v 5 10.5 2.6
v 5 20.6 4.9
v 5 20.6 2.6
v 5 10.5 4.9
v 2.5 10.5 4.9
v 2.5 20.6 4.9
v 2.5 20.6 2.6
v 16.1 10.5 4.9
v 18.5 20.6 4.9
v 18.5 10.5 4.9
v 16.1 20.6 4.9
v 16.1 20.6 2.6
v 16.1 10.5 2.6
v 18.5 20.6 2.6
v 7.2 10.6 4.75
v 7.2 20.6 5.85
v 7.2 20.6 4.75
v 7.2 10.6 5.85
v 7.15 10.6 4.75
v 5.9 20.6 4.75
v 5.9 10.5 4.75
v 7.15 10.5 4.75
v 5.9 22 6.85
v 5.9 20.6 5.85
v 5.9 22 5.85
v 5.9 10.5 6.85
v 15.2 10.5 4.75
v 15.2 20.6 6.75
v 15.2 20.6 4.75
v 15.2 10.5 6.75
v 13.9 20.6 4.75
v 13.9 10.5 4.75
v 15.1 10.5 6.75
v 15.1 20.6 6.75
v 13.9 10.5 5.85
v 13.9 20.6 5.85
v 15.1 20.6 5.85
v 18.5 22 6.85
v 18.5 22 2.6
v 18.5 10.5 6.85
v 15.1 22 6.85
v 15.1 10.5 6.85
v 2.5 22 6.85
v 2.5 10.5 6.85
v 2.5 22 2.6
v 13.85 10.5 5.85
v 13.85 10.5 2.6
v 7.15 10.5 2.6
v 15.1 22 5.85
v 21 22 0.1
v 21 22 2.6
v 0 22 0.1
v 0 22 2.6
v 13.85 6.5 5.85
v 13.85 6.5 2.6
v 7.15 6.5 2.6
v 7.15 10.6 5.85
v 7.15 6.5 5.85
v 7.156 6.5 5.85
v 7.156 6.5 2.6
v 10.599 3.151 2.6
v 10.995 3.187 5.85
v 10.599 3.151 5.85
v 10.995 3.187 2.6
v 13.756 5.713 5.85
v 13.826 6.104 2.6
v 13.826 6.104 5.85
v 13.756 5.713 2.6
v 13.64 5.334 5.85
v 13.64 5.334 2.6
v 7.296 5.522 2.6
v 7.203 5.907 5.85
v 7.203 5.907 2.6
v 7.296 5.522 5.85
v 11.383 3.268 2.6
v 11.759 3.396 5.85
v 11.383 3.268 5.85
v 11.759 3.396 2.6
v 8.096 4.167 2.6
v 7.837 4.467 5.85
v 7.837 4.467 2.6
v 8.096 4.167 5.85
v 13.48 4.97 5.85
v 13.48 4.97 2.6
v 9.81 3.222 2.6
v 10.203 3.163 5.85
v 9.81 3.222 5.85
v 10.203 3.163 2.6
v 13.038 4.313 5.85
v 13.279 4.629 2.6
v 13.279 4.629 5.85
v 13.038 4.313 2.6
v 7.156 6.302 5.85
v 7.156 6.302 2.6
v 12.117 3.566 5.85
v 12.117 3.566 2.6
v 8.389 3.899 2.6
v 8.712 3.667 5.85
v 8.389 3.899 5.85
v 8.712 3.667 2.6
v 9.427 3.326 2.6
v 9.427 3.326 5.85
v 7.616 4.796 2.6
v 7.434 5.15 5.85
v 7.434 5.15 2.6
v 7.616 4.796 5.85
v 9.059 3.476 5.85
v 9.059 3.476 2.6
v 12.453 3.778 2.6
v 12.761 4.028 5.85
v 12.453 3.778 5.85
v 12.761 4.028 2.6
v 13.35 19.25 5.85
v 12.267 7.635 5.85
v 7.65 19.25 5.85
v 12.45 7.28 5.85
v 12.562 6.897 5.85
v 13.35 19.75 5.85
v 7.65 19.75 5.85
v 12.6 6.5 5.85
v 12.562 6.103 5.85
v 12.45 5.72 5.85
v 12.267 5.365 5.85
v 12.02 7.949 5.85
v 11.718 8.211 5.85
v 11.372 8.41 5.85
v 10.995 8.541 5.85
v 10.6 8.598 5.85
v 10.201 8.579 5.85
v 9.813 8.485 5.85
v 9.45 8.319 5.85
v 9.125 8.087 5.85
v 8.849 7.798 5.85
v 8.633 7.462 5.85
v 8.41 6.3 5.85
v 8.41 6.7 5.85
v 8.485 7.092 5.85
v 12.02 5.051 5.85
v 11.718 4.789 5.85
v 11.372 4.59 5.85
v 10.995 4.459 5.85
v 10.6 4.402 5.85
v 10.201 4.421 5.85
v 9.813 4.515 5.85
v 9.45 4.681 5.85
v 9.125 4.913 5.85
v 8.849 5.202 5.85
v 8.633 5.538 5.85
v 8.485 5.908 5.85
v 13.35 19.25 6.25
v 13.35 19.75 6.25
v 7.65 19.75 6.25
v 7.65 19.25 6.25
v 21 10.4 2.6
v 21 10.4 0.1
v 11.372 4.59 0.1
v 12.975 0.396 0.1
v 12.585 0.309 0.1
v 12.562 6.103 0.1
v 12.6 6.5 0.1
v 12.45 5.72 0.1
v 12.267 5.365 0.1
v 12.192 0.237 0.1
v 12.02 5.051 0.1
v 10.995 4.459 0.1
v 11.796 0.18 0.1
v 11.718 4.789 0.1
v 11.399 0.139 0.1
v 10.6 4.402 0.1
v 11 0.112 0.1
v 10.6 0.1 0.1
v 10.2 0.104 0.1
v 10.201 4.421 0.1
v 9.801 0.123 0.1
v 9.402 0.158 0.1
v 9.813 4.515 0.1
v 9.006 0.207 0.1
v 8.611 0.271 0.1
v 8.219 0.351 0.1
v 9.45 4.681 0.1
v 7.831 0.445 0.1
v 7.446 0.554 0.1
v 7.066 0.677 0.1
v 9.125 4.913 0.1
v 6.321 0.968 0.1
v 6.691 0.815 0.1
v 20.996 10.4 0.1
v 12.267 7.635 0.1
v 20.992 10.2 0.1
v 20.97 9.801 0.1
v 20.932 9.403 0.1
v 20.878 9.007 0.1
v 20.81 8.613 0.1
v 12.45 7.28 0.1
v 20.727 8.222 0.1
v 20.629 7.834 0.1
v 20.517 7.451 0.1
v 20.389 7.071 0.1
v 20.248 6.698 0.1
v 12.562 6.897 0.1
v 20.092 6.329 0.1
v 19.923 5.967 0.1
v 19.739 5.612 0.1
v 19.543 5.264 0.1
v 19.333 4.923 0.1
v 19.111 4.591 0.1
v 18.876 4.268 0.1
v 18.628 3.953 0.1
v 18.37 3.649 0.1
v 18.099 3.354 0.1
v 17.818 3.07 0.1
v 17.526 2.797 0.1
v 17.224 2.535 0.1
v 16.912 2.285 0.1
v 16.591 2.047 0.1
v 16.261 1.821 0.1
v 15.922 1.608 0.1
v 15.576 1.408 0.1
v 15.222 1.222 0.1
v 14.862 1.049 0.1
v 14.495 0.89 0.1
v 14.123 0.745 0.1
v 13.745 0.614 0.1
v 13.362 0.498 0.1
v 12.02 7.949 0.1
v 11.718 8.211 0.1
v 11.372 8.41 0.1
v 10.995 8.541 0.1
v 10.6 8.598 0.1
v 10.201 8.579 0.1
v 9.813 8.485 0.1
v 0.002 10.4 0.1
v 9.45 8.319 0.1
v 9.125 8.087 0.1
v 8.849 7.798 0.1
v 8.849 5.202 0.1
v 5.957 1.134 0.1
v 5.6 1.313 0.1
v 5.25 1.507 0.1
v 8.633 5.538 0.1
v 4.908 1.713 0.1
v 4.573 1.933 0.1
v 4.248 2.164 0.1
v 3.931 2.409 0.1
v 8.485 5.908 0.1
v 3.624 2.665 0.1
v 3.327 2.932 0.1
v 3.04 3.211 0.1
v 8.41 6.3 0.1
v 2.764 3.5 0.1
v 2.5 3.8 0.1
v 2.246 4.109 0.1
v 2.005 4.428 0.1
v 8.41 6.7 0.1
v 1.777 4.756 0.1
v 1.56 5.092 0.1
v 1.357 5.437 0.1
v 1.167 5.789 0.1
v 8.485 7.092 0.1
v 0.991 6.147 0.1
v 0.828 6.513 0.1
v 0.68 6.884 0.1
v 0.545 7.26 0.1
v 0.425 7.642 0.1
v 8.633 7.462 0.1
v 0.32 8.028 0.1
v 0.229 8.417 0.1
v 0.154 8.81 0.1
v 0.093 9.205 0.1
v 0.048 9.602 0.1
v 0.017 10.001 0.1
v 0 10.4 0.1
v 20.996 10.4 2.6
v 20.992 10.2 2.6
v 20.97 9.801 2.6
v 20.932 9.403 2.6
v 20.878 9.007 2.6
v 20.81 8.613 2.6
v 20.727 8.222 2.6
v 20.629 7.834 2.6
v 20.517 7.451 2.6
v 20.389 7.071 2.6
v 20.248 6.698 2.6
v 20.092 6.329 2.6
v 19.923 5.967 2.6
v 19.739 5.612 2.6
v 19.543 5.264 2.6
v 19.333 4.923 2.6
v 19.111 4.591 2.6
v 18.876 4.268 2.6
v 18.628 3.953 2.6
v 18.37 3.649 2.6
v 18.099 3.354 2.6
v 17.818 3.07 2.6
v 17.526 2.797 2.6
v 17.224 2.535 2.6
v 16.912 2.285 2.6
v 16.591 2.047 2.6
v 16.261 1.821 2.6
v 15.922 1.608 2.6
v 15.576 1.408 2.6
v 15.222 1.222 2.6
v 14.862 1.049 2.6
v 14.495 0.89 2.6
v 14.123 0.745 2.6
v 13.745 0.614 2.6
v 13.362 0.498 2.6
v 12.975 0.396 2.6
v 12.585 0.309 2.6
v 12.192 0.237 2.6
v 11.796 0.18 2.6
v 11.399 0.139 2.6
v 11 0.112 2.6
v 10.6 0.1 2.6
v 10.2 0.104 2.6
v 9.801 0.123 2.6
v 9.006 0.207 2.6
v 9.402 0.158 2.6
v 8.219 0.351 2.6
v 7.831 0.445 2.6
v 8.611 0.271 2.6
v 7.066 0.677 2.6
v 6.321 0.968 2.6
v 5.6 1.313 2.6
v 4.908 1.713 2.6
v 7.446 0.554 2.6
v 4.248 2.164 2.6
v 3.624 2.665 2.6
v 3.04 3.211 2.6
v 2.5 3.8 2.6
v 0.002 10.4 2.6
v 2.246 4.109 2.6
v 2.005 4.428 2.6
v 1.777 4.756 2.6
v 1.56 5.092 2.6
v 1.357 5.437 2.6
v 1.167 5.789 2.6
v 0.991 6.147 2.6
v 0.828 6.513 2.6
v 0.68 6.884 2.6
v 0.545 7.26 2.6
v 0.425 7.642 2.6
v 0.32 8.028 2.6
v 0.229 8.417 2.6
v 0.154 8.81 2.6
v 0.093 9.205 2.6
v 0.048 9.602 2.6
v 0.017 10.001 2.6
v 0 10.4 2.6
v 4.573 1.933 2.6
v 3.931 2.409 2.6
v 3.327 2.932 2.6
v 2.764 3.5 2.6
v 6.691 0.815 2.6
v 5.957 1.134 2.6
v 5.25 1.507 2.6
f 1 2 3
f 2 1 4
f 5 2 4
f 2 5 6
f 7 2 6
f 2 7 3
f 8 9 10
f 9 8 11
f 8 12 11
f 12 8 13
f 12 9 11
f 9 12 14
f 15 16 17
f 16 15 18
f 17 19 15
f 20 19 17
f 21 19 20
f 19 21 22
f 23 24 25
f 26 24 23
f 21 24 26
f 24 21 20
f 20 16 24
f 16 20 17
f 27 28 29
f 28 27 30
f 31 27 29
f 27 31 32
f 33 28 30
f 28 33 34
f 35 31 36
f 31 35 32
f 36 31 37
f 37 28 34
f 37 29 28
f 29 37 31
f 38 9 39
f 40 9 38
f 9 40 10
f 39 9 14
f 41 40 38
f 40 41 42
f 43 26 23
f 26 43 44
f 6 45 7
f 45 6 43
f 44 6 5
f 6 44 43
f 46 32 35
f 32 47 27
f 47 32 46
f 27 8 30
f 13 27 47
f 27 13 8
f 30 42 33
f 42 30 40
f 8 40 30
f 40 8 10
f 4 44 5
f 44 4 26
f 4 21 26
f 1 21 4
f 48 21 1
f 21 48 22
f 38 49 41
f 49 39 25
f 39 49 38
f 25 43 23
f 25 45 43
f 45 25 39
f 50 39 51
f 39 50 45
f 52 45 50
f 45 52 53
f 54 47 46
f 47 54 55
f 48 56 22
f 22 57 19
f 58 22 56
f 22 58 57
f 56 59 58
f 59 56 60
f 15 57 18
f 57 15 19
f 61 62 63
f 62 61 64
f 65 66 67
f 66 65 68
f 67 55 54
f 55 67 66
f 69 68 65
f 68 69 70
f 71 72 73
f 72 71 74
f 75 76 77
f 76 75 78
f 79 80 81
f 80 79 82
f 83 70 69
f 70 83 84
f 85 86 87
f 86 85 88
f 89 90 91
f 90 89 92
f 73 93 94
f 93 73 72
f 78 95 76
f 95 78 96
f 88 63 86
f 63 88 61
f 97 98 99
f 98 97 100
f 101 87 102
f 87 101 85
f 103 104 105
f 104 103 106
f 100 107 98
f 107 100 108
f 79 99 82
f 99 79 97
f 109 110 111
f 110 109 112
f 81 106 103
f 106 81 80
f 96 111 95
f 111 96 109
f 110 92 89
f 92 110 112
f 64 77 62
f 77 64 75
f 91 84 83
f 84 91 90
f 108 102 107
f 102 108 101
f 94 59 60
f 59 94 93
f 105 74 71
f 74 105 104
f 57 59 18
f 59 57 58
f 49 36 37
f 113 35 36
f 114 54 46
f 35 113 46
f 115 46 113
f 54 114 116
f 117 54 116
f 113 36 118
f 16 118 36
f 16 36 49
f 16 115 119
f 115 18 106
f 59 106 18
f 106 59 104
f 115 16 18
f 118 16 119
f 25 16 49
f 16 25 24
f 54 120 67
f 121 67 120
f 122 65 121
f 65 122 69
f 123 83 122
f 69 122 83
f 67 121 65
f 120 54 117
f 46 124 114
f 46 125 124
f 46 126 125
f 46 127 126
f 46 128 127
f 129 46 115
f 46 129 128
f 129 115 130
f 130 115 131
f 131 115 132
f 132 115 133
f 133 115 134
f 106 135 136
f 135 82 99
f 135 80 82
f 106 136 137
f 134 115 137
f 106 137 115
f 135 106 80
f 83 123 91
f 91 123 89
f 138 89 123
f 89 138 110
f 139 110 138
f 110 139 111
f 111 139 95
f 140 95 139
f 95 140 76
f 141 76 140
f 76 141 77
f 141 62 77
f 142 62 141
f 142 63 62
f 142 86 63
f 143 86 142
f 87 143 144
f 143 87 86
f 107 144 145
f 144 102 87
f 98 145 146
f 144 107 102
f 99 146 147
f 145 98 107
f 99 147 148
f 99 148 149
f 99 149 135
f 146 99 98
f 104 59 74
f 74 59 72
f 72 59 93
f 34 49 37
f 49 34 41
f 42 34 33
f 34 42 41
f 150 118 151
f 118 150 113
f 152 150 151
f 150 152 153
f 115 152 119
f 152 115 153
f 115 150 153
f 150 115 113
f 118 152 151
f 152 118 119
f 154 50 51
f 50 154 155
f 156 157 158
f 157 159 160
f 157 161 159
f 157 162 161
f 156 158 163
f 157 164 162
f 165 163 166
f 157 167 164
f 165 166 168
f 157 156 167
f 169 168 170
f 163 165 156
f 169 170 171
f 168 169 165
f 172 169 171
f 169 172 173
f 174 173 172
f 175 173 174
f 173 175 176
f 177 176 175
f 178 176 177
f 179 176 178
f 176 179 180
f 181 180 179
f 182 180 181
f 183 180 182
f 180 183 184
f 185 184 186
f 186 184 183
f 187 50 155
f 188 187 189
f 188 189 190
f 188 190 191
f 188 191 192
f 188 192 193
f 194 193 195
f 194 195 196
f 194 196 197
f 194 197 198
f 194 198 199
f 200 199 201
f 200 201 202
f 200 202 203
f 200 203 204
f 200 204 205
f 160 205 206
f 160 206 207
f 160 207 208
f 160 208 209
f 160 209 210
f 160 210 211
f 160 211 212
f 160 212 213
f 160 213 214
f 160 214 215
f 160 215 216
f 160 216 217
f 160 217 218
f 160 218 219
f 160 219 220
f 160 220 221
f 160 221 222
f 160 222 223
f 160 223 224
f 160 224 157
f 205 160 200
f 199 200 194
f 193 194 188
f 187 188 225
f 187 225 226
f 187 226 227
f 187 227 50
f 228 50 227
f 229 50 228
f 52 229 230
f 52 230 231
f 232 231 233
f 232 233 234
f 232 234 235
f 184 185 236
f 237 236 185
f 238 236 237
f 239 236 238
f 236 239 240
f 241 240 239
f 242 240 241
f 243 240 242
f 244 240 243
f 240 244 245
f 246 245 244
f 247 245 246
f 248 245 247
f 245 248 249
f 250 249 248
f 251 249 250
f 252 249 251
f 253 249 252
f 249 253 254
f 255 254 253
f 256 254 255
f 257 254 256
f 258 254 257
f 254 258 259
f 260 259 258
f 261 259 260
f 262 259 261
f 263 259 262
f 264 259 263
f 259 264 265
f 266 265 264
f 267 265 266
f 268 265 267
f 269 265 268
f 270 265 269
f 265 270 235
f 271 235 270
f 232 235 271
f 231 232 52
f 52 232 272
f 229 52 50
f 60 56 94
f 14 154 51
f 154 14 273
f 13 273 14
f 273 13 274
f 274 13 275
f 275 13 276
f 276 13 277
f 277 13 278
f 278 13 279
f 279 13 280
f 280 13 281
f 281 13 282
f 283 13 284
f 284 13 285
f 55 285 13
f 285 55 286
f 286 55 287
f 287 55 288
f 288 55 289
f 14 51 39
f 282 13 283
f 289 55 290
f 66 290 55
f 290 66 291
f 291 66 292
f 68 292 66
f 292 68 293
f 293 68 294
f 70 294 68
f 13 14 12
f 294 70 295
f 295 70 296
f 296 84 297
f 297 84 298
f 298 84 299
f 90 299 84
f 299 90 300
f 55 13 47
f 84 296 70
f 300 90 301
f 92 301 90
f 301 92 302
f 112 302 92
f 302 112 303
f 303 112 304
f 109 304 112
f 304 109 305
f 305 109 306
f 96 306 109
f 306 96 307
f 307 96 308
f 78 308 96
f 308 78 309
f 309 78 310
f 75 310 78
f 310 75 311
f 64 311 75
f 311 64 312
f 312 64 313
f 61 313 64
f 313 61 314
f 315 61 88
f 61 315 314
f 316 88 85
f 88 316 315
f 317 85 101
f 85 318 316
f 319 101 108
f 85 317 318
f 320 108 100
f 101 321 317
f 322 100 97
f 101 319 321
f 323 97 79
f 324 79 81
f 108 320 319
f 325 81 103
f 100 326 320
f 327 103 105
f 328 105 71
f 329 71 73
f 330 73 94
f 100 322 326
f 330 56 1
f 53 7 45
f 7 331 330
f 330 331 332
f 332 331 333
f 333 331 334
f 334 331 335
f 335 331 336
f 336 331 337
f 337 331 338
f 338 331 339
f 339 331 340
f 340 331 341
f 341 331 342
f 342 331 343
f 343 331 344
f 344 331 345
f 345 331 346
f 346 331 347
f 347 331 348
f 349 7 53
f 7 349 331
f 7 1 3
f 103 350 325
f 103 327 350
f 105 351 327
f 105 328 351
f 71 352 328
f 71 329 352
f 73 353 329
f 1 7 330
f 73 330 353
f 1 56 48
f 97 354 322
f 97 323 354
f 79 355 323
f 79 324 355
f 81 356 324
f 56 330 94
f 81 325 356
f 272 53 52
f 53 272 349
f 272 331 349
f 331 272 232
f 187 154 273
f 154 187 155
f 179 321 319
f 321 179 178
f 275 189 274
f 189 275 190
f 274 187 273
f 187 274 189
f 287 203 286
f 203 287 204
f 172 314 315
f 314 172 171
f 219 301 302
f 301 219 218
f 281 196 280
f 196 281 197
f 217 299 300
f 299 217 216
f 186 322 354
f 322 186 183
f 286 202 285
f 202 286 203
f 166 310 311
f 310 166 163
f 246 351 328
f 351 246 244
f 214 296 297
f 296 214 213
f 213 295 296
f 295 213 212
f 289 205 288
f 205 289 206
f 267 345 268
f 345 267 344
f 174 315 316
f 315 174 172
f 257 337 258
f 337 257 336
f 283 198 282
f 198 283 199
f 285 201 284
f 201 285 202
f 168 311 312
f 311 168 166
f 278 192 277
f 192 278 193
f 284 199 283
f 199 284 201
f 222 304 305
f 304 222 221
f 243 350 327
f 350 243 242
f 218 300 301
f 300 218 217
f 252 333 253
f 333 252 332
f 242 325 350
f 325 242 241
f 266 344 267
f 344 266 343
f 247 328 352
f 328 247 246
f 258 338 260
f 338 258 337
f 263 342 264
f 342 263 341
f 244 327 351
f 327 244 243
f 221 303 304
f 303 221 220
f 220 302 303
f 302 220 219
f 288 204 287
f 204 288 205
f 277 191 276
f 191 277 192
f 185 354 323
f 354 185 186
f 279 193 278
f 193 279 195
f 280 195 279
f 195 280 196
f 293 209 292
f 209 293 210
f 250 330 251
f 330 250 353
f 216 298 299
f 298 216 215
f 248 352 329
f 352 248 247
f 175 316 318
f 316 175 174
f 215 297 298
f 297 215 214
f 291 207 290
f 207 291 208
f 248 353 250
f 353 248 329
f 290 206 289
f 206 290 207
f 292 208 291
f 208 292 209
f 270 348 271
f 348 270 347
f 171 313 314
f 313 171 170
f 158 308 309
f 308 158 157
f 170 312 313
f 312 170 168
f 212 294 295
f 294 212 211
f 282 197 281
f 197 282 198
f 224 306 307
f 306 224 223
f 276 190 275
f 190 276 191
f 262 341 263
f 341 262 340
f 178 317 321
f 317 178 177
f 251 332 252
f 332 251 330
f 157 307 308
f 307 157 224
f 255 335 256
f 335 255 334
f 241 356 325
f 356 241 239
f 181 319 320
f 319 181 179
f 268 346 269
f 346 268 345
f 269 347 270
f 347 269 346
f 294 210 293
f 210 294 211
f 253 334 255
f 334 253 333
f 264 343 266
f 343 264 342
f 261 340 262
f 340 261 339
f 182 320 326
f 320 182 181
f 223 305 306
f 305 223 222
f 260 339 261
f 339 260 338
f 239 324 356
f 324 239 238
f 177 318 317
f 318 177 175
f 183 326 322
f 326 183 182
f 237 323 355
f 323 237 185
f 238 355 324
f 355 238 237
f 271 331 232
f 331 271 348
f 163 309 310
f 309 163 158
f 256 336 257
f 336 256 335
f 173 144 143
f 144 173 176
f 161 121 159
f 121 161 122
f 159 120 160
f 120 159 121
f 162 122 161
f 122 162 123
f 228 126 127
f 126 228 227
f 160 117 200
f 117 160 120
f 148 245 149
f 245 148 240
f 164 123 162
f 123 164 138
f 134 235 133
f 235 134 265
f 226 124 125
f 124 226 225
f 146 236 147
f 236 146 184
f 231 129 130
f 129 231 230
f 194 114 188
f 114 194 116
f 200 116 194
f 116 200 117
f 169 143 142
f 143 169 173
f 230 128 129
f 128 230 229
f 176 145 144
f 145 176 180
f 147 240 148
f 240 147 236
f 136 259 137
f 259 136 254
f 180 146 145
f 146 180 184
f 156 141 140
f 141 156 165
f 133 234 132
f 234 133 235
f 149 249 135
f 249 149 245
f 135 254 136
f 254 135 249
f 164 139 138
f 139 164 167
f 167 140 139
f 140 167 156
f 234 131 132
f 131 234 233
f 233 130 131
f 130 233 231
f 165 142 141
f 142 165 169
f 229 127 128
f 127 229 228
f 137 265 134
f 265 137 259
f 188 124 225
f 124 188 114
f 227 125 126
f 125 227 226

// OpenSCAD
// Schlaufen Halterung für G5XT PMR Funkgerät

// Resolution for 3D printing:
$fa = 1;
$fs = 0.4;

// Allgemeines:
delta                  =   0.1; // Standard Durchdringung

clip_breite            =  16.0;
clip_laenge            =  11.5;
clip_hoehe             =   4.25 + delta;

oesen_basis_breite     =   6.7;
oesen_basis_laenge     =   4.0;
oesen_durchmesser      =  oesen_basis_breite;
loch_durchmesser       =  oesen_durchmesser - 2.5;

aussparung_breite      =   9.0;
aussparung_laenge      =  clip_laenge + 2*delta;
aussparung_hoehe       =   1.0;

schiene_breite         =   2.5;
schiene_laenge         =  10.0;
schiene_hoehe          =   2.5;

sperre_breite          =  oesen_basis_breite-1.0;
sperre_laenge          =   0.5;
sperre_y_offset        =  clip_laenge - schiene_laenge 
                         + 0.75;
sperre_hoehe           =   0.5;

nut_breite             =   1.2;
nut_laenge             =  schiene_laenge;
nut_hoehe              =   2.0;

deckel_breite          =  21.0;
deckel_laenge          =  clip_laenge;
deckel_hoehe           =   2.5;

module nut() {
    cube([nut_breite + delta,
          nut_laenge + 2*delta, 
          nut_hoehe]);
};

module schiene() {
    cube([schiene_breite + delta,
          schiene_laenge + 2*delta, 
          schiene_hoehe + delta]);
};

module schienen() {
    // Schiene links:
    translate([-delta, 
               clip_laenge - schiene_laenge - delta,
               clip_hoehe - schiene_hoehe + delta])
        schiene();
    // Schiene rechts:
    translate([clip_breite - schiene_breite + delta,
               clip_laenge - schiene_laenge - delta,
               clip_hoehe - schiene_hoehe + delta])
        schiene();
    
    // Nut links:
    translate([(clip_breite - aussparung_breite) / 2
               -delta, clip_laenge - nut_laenge - delta,
               +delta])
        nut();
    
    // Nut rechts:
    translate([clip_breite - nut_breite + 2*delta
               -(clip_breite - aussparung_breite) / 2
               - delta, clip_laenge - nut_laenge - delta,
               +delta])
        nut();    
};

module clip() {
    difference() {
        cube([clip_breite, clip_laenge, clip_hoehe]);
        schienen();
    };
};

module oesen_ring() {
    cylinder(clip_hoehe, d=oesen_durchmesser, center=true);
};

module oese() {
    // Ösen Basis:
    translate([(clip_breite - oesen_basis_breite) / 2,
                clip_laenge - delta, 0])
        cube([oesen_basis_breite, oesen_basis_laenge +
              delta, clip_hoehe]);
    // Ösenring:
    translate([clip_breite / 2,
               clip_laenge + oesen_basis_laenge,
               clip_hoehe / 2])
        oesen_ring();
};

module hole() {
    translate([deckel_breite / 2,
               clip_laenge + oesen_basis_laenge, 
               (clip_hoehe + deckel_hoehe) / 2 -delta])
        cylinder(clip_hoehe + deckel_hoehe + 2*delta,
                 d=loch_durchmesser, center=true); 
};

module bauteil_ohne_aussparung() {
    // Der Clip:
    clip();
    // Öse:
    oese();
};

module aussparung() {
    translate([(clip_breite - oesen_basis_breite) / 2 
               -delta,
               -delta,
               -delta])
        cube([oesen_basis_breite + 2*delta,
              clip_laenge + oesen_basis_laenge +
              oesen_durchmesser / 2 + 2*delta,
              aussparung_hoehe + delta]);
    
    translate([(clip_breite - aussparung_breite) / 2 
               -delta,
               -delta,
               -delta])
        cube([aussparung_breite + 2*delta,
              aussparung_laenge,
              aussparung_hoehe + delta]);
};

module sperre() {
    translate([(clip_breite - sperre_breite) / 2,
               sperre_y_offset,
               aussparung_hoehe - sperre_hoehe + delta])
        cube([sperre_breite, sperre_laenge,
              sperre_hoehe + delta]);
};

module deckel() {
    cube([deckel_breite, deckel_laenge + delta,
          deckel_hoehe]);
    translate([deckel_breite / 2,
               deckel_laenge - delta,
               deckel_hoehe / 2])
        cylinder(deckel_hoehe, d=deckel_breite, 
                 center=true);
};

module bauteil_ohne_deckel() {
    // Rastvorrichtung:
    difference() {
        bauteil_ohne_aussparung();
        aussparung();
    };
    sperre();
};

module bauteil_ohne_loch() {
    translate([(deckel_breite - clip_breite) / 2,
                0, 0])
        bauteil_ohne_deckel();
    translate([0, 0, clip_hoehe - delta])
        deckel();
};

module bauteil() {
    difference() {
        bauteil_ohne_loch();
        hole();
    };
};

// Hindrehen zum Drucken:
translate([0, deckel_laenge + deckel_breite / 2,
           clip_hoehe + deckel_hoehe])
    rotate([180, 0, 0])
        bauteil();
